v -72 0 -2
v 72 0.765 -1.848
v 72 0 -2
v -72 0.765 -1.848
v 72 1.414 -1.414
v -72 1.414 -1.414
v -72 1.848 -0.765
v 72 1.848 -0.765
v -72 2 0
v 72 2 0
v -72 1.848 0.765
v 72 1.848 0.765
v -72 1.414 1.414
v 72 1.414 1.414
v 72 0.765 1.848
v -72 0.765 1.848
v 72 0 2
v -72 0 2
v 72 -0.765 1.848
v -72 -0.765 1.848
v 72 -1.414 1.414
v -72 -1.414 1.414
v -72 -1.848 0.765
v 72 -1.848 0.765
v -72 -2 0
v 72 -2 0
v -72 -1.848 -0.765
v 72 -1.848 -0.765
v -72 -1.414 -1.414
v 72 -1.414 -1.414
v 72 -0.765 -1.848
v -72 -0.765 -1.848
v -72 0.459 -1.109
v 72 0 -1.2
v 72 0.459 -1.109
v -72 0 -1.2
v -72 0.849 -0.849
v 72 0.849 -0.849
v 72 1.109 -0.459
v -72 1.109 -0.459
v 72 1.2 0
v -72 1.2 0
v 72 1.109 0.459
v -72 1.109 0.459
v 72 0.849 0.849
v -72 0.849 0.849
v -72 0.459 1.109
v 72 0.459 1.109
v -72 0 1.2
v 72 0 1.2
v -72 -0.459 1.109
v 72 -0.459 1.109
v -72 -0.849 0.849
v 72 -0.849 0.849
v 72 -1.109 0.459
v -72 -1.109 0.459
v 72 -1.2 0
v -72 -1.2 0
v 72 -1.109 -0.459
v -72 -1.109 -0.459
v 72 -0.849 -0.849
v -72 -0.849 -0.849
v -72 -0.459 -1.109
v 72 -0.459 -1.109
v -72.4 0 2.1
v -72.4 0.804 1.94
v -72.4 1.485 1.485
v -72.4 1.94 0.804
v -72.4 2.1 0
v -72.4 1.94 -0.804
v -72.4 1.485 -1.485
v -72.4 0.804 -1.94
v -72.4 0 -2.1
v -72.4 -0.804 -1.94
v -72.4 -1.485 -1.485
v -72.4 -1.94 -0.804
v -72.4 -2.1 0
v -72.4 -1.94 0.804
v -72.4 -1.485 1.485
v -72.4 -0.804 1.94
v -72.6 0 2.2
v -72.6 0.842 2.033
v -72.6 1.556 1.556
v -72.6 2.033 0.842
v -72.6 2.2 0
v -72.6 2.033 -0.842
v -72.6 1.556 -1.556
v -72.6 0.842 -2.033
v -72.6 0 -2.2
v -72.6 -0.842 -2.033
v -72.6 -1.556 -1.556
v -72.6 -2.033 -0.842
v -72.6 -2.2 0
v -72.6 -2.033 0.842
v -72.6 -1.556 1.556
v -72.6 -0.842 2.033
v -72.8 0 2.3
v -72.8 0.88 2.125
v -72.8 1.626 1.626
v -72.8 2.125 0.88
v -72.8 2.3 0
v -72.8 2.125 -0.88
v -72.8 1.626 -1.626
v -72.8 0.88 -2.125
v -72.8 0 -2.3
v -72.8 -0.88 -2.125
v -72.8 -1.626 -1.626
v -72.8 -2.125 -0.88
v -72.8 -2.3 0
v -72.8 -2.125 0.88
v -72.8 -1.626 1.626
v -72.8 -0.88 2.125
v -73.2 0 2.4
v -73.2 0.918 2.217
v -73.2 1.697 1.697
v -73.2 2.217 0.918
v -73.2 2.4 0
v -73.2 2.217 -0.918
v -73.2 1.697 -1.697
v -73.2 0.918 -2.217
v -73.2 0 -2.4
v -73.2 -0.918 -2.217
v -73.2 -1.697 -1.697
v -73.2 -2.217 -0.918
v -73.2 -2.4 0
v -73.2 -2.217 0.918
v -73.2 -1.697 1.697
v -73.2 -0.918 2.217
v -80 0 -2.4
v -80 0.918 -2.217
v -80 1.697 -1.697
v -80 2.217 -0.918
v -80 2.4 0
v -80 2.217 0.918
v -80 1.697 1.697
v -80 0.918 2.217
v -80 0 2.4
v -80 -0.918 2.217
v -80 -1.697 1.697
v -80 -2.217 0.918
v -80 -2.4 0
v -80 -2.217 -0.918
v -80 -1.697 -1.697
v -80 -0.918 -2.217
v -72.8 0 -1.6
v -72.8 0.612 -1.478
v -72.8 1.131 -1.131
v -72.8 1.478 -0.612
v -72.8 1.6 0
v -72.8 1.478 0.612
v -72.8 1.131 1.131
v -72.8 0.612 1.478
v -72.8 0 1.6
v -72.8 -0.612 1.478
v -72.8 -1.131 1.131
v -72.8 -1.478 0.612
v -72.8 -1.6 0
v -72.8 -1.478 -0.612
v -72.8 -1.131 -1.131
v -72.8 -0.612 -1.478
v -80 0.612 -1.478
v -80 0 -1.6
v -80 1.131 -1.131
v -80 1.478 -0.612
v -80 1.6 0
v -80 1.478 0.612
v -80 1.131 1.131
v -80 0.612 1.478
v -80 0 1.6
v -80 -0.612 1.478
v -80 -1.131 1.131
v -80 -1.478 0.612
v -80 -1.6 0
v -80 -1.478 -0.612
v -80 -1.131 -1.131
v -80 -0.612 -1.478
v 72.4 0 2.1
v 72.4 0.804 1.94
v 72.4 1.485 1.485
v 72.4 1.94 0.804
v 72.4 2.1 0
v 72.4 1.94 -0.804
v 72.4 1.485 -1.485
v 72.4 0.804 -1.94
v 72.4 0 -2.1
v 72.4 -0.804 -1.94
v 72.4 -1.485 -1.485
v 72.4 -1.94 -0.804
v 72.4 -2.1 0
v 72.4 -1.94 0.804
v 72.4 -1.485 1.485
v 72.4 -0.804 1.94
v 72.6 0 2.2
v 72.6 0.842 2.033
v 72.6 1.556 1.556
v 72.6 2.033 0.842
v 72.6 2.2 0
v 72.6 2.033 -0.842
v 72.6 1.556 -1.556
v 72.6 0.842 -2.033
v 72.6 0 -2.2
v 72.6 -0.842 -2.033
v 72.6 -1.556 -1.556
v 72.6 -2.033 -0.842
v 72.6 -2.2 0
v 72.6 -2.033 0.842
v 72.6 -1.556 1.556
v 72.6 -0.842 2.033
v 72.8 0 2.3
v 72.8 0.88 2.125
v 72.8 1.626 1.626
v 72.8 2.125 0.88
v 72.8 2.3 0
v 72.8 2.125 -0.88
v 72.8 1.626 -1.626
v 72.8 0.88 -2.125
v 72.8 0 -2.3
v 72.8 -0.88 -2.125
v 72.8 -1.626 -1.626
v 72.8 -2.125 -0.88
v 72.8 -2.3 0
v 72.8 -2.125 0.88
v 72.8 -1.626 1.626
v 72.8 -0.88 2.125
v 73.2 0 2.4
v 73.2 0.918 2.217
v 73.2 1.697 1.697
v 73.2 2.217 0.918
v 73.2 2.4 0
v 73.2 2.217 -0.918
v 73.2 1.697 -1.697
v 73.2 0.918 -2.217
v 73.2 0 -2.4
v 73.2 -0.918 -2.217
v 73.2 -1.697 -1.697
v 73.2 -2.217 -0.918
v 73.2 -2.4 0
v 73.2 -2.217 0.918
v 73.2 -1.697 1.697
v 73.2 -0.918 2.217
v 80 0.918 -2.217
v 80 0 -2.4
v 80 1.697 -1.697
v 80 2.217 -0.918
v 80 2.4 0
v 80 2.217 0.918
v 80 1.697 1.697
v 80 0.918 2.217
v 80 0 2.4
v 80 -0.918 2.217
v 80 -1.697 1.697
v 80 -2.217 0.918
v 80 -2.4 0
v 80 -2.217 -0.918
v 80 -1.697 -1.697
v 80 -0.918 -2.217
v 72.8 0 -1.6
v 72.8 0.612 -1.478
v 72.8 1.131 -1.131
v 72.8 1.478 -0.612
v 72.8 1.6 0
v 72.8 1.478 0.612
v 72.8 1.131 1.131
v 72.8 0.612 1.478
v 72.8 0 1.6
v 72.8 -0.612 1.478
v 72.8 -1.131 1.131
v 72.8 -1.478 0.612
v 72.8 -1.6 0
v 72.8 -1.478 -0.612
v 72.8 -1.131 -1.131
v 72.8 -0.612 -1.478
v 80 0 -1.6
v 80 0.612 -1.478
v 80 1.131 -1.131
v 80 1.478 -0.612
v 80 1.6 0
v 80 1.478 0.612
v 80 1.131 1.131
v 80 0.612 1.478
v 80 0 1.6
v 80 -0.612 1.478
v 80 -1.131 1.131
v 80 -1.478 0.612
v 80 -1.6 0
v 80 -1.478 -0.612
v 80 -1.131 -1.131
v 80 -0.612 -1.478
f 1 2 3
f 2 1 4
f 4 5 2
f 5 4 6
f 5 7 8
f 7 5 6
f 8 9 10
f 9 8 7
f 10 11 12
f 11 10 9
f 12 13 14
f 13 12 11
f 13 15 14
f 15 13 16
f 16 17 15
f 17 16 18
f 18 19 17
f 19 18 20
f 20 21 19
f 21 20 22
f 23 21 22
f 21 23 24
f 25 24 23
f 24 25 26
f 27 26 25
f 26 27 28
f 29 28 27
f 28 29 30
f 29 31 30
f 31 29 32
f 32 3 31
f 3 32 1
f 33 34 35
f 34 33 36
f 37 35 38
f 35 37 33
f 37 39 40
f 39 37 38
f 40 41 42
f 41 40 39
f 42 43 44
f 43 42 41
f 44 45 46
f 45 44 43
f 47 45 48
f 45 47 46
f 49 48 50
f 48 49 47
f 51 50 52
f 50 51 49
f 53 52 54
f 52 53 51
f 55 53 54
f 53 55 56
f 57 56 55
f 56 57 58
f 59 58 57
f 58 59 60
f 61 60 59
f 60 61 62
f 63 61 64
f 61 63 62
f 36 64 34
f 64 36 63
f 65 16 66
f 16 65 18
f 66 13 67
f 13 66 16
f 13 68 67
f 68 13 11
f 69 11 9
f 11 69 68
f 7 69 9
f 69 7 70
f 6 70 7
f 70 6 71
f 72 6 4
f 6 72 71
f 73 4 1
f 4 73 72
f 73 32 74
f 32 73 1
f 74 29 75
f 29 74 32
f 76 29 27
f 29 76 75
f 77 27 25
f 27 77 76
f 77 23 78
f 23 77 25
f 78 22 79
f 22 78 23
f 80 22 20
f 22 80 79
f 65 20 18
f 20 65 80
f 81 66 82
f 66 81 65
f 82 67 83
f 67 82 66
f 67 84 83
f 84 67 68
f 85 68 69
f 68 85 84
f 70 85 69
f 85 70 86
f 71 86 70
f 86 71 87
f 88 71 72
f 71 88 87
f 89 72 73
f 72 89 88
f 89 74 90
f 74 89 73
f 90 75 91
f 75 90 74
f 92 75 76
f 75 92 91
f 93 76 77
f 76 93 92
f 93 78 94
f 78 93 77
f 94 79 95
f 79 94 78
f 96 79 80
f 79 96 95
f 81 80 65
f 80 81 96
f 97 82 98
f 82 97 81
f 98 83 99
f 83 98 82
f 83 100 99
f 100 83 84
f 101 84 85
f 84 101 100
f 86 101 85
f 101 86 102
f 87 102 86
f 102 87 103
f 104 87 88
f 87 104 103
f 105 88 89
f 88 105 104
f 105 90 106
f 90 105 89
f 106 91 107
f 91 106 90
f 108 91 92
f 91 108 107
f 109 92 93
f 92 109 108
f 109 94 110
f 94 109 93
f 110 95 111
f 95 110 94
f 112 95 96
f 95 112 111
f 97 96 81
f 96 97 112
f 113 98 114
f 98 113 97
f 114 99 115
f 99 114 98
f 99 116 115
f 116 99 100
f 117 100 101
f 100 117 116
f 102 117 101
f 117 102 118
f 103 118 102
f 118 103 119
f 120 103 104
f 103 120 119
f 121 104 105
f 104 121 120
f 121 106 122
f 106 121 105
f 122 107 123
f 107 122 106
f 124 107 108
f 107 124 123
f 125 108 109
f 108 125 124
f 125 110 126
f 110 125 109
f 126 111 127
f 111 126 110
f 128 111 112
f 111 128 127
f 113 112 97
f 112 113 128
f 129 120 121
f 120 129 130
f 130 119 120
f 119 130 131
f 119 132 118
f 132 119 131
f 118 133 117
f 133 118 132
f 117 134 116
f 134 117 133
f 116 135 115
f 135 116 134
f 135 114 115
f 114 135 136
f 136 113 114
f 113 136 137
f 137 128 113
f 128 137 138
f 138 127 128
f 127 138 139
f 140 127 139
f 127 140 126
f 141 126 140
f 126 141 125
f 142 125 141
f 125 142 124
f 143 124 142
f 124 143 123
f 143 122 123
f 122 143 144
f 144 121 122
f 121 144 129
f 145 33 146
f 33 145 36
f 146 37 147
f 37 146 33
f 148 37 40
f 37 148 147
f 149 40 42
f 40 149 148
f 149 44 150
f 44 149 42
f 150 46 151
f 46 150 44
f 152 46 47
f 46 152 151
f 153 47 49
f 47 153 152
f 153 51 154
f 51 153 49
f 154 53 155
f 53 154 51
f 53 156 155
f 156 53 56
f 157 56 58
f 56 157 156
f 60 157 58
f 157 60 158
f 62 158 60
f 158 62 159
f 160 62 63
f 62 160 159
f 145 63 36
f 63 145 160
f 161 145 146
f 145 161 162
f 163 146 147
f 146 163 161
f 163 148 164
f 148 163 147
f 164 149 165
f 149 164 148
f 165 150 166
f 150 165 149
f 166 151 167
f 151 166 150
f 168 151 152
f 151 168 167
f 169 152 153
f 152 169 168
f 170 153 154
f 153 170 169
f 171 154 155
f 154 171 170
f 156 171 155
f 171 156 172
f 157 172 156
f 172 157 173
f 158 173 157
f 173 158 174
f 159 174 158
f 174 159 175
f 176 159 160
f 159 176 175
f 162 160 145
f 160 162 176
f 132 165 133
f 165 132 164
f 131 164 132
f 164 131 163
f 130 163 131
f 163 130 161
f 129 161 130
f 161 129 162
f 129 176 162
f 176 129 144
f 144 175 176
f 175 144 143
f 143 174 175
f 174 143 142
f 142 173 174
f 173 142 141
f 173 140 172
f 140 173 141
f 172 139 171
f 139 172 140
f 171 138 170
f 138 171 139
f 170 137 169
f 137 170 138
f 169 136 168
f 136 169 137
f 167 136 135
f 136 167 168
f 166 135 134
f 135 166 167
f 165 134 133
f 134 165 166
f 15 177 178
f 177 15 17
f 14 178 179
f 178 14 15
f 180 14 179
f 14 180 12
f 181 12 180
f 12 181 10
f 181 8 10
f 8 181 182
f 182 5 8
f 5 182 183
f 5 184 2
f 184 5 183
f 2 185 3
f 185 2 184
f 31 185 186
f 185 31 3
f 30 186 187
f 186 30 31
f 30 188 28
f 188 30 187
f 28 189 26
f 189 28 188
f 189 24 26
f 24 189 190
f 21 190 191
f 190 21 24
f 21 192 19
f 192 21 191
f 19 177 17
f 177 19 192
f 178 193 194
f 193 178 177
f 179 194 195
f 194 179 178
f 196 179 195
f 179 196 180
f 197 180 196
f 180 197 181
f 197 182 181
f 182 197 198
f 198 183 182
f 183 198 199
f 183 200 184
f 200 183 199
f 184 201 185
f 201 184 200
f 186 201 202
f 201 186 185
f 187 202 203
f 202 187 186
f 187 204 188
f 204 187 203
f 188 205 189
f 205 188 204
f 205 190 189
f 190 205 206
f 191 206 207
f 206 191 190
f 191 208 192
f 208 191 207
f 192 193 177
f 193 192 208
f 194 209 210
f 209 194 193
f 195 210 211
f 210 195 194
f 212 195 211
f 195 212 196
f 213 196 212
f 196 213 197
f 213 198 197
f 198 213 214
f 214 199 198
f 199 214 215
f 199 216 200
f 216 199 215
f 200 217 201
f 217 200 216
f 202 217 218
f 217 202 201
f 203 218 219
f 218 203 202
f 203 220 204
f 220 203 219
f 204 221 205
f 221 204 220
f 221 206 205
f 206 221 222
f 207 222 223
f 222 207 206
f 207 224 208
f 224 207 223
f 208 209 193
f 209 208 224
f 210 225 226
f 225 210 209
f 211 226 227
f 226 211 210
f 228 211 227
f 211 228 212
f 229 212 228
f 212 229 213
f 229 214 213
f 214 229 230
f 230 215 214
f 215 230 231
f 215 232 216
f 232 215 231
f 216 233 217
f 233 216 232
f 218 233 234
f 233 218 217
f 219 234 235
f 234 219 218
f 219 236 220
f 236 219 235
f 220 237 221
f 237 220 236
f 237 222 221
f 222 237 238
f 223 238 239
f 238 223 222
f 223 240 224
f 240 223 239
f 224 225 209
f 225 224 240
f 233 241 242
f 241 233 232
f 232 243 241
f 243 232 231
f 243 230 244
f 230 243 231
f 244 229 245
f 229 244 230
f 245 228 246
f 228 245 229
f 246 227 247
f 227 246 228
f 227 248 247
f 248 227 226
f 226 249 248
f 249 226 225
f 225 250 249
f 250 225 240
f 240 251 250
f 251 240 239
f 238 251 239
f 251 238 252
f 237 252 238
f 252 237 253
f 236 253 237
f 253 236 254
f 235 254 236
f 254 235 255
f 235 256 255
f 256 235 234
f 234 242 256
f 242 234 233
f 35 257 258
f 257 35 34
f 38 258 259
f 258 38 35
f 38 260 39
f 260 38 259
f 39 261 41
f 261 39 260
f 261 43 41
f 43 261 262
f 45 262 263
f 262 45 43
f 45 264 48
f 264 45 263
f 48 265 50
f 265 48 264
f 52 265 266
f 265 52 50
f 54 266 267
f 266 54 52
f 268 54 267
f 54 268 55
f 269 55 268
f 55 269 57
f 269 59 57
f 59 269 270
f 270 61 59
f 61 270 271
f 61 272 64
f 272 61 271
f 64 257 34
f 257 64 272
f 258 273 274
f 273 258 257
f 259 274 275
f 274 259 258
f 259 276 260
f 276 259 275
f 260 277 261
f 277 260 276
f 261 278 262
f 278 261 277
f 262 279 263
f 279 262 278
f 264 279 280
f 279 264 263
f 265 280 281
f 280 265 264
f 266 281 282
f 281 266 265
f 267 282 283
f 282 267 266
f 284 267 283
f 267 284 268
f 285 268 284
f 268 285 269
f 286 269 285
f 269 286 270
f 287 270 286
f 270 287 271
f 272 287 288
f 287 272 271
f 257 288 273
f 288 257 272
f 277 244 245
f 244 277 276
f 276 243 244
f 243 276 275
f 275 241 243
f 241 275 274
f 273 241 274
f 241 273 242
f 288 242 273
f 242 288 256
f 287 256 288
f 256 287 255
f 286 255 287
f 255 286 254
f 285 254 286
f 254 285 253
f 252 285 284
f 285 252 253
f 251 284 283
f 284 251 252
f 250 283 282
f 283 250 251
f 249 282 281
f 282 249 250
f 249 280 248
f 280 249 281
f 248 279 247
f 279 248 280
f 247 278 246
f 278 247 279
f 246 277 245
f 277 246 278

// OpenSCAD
use <../lib.scad>
use <71533k01.scad>
use <71533k03.scad>
$fa=1; $fs=0.2;
function ldraw_lib__87950_f2(realsolid=false) = [
// 0 Technic Pneumatic Tube 20L with End Bulges
// 0 Name: 87950-f2.dat
// 0 Author: Philippe Hurbain [Philo]
// 0 !LDRAW_ORG Part UPDATE 2020-01
// 0 !LICENSE Licensed under CC BY 2.0 and CC BY 4.0 : see CAreadme.txt
// 
// 0 BFC CERTIFY CCW
  [0,"BFC","CERTIFY"],
  [0,"BFC","CCW"],
// 
// 0 !KEYWORDS 160 mm
// 
// 0 !HISTORY 2020-06-28 [PTadmin] Official Update 2020-01
// 
// 
// 1 16 -180 0 0 0 360 0 1 0 0 0 0 1 71533k03.dat
  [1,16,-180,0,0,0,360,0,1,0,0,0,0,1, ldraw_lib__71533k03(realsolid)],
// 1 16 -180 0 0 0 -1 0 1 0 0 0 0 1 71533k01.dat
  [1,16,-180,0,0,0,-1,0,1,0,0,0,0,1, ldraw_lib__71533k01(realsolid)],
// 1 16 180 0 0 0 1 0 1 0 0 0 0 1 71533k01.dat
  [1,16,180,0,0,0,1,0,1,0,0,0,0,1, ldraw_lib__71533k01(realsolid)],
];
module ldraw_lib__87950_f2(step=0, col=false, unit=2/5, alt=false, line=0.2, solid=!$preview)
    makepoly(ldraw_lib__87950_f2(solid), step=step, col=col, unit=unit, alt=alt, line=line, solid=solid);
ldraw_lib__87950_f2(line=0.2);
